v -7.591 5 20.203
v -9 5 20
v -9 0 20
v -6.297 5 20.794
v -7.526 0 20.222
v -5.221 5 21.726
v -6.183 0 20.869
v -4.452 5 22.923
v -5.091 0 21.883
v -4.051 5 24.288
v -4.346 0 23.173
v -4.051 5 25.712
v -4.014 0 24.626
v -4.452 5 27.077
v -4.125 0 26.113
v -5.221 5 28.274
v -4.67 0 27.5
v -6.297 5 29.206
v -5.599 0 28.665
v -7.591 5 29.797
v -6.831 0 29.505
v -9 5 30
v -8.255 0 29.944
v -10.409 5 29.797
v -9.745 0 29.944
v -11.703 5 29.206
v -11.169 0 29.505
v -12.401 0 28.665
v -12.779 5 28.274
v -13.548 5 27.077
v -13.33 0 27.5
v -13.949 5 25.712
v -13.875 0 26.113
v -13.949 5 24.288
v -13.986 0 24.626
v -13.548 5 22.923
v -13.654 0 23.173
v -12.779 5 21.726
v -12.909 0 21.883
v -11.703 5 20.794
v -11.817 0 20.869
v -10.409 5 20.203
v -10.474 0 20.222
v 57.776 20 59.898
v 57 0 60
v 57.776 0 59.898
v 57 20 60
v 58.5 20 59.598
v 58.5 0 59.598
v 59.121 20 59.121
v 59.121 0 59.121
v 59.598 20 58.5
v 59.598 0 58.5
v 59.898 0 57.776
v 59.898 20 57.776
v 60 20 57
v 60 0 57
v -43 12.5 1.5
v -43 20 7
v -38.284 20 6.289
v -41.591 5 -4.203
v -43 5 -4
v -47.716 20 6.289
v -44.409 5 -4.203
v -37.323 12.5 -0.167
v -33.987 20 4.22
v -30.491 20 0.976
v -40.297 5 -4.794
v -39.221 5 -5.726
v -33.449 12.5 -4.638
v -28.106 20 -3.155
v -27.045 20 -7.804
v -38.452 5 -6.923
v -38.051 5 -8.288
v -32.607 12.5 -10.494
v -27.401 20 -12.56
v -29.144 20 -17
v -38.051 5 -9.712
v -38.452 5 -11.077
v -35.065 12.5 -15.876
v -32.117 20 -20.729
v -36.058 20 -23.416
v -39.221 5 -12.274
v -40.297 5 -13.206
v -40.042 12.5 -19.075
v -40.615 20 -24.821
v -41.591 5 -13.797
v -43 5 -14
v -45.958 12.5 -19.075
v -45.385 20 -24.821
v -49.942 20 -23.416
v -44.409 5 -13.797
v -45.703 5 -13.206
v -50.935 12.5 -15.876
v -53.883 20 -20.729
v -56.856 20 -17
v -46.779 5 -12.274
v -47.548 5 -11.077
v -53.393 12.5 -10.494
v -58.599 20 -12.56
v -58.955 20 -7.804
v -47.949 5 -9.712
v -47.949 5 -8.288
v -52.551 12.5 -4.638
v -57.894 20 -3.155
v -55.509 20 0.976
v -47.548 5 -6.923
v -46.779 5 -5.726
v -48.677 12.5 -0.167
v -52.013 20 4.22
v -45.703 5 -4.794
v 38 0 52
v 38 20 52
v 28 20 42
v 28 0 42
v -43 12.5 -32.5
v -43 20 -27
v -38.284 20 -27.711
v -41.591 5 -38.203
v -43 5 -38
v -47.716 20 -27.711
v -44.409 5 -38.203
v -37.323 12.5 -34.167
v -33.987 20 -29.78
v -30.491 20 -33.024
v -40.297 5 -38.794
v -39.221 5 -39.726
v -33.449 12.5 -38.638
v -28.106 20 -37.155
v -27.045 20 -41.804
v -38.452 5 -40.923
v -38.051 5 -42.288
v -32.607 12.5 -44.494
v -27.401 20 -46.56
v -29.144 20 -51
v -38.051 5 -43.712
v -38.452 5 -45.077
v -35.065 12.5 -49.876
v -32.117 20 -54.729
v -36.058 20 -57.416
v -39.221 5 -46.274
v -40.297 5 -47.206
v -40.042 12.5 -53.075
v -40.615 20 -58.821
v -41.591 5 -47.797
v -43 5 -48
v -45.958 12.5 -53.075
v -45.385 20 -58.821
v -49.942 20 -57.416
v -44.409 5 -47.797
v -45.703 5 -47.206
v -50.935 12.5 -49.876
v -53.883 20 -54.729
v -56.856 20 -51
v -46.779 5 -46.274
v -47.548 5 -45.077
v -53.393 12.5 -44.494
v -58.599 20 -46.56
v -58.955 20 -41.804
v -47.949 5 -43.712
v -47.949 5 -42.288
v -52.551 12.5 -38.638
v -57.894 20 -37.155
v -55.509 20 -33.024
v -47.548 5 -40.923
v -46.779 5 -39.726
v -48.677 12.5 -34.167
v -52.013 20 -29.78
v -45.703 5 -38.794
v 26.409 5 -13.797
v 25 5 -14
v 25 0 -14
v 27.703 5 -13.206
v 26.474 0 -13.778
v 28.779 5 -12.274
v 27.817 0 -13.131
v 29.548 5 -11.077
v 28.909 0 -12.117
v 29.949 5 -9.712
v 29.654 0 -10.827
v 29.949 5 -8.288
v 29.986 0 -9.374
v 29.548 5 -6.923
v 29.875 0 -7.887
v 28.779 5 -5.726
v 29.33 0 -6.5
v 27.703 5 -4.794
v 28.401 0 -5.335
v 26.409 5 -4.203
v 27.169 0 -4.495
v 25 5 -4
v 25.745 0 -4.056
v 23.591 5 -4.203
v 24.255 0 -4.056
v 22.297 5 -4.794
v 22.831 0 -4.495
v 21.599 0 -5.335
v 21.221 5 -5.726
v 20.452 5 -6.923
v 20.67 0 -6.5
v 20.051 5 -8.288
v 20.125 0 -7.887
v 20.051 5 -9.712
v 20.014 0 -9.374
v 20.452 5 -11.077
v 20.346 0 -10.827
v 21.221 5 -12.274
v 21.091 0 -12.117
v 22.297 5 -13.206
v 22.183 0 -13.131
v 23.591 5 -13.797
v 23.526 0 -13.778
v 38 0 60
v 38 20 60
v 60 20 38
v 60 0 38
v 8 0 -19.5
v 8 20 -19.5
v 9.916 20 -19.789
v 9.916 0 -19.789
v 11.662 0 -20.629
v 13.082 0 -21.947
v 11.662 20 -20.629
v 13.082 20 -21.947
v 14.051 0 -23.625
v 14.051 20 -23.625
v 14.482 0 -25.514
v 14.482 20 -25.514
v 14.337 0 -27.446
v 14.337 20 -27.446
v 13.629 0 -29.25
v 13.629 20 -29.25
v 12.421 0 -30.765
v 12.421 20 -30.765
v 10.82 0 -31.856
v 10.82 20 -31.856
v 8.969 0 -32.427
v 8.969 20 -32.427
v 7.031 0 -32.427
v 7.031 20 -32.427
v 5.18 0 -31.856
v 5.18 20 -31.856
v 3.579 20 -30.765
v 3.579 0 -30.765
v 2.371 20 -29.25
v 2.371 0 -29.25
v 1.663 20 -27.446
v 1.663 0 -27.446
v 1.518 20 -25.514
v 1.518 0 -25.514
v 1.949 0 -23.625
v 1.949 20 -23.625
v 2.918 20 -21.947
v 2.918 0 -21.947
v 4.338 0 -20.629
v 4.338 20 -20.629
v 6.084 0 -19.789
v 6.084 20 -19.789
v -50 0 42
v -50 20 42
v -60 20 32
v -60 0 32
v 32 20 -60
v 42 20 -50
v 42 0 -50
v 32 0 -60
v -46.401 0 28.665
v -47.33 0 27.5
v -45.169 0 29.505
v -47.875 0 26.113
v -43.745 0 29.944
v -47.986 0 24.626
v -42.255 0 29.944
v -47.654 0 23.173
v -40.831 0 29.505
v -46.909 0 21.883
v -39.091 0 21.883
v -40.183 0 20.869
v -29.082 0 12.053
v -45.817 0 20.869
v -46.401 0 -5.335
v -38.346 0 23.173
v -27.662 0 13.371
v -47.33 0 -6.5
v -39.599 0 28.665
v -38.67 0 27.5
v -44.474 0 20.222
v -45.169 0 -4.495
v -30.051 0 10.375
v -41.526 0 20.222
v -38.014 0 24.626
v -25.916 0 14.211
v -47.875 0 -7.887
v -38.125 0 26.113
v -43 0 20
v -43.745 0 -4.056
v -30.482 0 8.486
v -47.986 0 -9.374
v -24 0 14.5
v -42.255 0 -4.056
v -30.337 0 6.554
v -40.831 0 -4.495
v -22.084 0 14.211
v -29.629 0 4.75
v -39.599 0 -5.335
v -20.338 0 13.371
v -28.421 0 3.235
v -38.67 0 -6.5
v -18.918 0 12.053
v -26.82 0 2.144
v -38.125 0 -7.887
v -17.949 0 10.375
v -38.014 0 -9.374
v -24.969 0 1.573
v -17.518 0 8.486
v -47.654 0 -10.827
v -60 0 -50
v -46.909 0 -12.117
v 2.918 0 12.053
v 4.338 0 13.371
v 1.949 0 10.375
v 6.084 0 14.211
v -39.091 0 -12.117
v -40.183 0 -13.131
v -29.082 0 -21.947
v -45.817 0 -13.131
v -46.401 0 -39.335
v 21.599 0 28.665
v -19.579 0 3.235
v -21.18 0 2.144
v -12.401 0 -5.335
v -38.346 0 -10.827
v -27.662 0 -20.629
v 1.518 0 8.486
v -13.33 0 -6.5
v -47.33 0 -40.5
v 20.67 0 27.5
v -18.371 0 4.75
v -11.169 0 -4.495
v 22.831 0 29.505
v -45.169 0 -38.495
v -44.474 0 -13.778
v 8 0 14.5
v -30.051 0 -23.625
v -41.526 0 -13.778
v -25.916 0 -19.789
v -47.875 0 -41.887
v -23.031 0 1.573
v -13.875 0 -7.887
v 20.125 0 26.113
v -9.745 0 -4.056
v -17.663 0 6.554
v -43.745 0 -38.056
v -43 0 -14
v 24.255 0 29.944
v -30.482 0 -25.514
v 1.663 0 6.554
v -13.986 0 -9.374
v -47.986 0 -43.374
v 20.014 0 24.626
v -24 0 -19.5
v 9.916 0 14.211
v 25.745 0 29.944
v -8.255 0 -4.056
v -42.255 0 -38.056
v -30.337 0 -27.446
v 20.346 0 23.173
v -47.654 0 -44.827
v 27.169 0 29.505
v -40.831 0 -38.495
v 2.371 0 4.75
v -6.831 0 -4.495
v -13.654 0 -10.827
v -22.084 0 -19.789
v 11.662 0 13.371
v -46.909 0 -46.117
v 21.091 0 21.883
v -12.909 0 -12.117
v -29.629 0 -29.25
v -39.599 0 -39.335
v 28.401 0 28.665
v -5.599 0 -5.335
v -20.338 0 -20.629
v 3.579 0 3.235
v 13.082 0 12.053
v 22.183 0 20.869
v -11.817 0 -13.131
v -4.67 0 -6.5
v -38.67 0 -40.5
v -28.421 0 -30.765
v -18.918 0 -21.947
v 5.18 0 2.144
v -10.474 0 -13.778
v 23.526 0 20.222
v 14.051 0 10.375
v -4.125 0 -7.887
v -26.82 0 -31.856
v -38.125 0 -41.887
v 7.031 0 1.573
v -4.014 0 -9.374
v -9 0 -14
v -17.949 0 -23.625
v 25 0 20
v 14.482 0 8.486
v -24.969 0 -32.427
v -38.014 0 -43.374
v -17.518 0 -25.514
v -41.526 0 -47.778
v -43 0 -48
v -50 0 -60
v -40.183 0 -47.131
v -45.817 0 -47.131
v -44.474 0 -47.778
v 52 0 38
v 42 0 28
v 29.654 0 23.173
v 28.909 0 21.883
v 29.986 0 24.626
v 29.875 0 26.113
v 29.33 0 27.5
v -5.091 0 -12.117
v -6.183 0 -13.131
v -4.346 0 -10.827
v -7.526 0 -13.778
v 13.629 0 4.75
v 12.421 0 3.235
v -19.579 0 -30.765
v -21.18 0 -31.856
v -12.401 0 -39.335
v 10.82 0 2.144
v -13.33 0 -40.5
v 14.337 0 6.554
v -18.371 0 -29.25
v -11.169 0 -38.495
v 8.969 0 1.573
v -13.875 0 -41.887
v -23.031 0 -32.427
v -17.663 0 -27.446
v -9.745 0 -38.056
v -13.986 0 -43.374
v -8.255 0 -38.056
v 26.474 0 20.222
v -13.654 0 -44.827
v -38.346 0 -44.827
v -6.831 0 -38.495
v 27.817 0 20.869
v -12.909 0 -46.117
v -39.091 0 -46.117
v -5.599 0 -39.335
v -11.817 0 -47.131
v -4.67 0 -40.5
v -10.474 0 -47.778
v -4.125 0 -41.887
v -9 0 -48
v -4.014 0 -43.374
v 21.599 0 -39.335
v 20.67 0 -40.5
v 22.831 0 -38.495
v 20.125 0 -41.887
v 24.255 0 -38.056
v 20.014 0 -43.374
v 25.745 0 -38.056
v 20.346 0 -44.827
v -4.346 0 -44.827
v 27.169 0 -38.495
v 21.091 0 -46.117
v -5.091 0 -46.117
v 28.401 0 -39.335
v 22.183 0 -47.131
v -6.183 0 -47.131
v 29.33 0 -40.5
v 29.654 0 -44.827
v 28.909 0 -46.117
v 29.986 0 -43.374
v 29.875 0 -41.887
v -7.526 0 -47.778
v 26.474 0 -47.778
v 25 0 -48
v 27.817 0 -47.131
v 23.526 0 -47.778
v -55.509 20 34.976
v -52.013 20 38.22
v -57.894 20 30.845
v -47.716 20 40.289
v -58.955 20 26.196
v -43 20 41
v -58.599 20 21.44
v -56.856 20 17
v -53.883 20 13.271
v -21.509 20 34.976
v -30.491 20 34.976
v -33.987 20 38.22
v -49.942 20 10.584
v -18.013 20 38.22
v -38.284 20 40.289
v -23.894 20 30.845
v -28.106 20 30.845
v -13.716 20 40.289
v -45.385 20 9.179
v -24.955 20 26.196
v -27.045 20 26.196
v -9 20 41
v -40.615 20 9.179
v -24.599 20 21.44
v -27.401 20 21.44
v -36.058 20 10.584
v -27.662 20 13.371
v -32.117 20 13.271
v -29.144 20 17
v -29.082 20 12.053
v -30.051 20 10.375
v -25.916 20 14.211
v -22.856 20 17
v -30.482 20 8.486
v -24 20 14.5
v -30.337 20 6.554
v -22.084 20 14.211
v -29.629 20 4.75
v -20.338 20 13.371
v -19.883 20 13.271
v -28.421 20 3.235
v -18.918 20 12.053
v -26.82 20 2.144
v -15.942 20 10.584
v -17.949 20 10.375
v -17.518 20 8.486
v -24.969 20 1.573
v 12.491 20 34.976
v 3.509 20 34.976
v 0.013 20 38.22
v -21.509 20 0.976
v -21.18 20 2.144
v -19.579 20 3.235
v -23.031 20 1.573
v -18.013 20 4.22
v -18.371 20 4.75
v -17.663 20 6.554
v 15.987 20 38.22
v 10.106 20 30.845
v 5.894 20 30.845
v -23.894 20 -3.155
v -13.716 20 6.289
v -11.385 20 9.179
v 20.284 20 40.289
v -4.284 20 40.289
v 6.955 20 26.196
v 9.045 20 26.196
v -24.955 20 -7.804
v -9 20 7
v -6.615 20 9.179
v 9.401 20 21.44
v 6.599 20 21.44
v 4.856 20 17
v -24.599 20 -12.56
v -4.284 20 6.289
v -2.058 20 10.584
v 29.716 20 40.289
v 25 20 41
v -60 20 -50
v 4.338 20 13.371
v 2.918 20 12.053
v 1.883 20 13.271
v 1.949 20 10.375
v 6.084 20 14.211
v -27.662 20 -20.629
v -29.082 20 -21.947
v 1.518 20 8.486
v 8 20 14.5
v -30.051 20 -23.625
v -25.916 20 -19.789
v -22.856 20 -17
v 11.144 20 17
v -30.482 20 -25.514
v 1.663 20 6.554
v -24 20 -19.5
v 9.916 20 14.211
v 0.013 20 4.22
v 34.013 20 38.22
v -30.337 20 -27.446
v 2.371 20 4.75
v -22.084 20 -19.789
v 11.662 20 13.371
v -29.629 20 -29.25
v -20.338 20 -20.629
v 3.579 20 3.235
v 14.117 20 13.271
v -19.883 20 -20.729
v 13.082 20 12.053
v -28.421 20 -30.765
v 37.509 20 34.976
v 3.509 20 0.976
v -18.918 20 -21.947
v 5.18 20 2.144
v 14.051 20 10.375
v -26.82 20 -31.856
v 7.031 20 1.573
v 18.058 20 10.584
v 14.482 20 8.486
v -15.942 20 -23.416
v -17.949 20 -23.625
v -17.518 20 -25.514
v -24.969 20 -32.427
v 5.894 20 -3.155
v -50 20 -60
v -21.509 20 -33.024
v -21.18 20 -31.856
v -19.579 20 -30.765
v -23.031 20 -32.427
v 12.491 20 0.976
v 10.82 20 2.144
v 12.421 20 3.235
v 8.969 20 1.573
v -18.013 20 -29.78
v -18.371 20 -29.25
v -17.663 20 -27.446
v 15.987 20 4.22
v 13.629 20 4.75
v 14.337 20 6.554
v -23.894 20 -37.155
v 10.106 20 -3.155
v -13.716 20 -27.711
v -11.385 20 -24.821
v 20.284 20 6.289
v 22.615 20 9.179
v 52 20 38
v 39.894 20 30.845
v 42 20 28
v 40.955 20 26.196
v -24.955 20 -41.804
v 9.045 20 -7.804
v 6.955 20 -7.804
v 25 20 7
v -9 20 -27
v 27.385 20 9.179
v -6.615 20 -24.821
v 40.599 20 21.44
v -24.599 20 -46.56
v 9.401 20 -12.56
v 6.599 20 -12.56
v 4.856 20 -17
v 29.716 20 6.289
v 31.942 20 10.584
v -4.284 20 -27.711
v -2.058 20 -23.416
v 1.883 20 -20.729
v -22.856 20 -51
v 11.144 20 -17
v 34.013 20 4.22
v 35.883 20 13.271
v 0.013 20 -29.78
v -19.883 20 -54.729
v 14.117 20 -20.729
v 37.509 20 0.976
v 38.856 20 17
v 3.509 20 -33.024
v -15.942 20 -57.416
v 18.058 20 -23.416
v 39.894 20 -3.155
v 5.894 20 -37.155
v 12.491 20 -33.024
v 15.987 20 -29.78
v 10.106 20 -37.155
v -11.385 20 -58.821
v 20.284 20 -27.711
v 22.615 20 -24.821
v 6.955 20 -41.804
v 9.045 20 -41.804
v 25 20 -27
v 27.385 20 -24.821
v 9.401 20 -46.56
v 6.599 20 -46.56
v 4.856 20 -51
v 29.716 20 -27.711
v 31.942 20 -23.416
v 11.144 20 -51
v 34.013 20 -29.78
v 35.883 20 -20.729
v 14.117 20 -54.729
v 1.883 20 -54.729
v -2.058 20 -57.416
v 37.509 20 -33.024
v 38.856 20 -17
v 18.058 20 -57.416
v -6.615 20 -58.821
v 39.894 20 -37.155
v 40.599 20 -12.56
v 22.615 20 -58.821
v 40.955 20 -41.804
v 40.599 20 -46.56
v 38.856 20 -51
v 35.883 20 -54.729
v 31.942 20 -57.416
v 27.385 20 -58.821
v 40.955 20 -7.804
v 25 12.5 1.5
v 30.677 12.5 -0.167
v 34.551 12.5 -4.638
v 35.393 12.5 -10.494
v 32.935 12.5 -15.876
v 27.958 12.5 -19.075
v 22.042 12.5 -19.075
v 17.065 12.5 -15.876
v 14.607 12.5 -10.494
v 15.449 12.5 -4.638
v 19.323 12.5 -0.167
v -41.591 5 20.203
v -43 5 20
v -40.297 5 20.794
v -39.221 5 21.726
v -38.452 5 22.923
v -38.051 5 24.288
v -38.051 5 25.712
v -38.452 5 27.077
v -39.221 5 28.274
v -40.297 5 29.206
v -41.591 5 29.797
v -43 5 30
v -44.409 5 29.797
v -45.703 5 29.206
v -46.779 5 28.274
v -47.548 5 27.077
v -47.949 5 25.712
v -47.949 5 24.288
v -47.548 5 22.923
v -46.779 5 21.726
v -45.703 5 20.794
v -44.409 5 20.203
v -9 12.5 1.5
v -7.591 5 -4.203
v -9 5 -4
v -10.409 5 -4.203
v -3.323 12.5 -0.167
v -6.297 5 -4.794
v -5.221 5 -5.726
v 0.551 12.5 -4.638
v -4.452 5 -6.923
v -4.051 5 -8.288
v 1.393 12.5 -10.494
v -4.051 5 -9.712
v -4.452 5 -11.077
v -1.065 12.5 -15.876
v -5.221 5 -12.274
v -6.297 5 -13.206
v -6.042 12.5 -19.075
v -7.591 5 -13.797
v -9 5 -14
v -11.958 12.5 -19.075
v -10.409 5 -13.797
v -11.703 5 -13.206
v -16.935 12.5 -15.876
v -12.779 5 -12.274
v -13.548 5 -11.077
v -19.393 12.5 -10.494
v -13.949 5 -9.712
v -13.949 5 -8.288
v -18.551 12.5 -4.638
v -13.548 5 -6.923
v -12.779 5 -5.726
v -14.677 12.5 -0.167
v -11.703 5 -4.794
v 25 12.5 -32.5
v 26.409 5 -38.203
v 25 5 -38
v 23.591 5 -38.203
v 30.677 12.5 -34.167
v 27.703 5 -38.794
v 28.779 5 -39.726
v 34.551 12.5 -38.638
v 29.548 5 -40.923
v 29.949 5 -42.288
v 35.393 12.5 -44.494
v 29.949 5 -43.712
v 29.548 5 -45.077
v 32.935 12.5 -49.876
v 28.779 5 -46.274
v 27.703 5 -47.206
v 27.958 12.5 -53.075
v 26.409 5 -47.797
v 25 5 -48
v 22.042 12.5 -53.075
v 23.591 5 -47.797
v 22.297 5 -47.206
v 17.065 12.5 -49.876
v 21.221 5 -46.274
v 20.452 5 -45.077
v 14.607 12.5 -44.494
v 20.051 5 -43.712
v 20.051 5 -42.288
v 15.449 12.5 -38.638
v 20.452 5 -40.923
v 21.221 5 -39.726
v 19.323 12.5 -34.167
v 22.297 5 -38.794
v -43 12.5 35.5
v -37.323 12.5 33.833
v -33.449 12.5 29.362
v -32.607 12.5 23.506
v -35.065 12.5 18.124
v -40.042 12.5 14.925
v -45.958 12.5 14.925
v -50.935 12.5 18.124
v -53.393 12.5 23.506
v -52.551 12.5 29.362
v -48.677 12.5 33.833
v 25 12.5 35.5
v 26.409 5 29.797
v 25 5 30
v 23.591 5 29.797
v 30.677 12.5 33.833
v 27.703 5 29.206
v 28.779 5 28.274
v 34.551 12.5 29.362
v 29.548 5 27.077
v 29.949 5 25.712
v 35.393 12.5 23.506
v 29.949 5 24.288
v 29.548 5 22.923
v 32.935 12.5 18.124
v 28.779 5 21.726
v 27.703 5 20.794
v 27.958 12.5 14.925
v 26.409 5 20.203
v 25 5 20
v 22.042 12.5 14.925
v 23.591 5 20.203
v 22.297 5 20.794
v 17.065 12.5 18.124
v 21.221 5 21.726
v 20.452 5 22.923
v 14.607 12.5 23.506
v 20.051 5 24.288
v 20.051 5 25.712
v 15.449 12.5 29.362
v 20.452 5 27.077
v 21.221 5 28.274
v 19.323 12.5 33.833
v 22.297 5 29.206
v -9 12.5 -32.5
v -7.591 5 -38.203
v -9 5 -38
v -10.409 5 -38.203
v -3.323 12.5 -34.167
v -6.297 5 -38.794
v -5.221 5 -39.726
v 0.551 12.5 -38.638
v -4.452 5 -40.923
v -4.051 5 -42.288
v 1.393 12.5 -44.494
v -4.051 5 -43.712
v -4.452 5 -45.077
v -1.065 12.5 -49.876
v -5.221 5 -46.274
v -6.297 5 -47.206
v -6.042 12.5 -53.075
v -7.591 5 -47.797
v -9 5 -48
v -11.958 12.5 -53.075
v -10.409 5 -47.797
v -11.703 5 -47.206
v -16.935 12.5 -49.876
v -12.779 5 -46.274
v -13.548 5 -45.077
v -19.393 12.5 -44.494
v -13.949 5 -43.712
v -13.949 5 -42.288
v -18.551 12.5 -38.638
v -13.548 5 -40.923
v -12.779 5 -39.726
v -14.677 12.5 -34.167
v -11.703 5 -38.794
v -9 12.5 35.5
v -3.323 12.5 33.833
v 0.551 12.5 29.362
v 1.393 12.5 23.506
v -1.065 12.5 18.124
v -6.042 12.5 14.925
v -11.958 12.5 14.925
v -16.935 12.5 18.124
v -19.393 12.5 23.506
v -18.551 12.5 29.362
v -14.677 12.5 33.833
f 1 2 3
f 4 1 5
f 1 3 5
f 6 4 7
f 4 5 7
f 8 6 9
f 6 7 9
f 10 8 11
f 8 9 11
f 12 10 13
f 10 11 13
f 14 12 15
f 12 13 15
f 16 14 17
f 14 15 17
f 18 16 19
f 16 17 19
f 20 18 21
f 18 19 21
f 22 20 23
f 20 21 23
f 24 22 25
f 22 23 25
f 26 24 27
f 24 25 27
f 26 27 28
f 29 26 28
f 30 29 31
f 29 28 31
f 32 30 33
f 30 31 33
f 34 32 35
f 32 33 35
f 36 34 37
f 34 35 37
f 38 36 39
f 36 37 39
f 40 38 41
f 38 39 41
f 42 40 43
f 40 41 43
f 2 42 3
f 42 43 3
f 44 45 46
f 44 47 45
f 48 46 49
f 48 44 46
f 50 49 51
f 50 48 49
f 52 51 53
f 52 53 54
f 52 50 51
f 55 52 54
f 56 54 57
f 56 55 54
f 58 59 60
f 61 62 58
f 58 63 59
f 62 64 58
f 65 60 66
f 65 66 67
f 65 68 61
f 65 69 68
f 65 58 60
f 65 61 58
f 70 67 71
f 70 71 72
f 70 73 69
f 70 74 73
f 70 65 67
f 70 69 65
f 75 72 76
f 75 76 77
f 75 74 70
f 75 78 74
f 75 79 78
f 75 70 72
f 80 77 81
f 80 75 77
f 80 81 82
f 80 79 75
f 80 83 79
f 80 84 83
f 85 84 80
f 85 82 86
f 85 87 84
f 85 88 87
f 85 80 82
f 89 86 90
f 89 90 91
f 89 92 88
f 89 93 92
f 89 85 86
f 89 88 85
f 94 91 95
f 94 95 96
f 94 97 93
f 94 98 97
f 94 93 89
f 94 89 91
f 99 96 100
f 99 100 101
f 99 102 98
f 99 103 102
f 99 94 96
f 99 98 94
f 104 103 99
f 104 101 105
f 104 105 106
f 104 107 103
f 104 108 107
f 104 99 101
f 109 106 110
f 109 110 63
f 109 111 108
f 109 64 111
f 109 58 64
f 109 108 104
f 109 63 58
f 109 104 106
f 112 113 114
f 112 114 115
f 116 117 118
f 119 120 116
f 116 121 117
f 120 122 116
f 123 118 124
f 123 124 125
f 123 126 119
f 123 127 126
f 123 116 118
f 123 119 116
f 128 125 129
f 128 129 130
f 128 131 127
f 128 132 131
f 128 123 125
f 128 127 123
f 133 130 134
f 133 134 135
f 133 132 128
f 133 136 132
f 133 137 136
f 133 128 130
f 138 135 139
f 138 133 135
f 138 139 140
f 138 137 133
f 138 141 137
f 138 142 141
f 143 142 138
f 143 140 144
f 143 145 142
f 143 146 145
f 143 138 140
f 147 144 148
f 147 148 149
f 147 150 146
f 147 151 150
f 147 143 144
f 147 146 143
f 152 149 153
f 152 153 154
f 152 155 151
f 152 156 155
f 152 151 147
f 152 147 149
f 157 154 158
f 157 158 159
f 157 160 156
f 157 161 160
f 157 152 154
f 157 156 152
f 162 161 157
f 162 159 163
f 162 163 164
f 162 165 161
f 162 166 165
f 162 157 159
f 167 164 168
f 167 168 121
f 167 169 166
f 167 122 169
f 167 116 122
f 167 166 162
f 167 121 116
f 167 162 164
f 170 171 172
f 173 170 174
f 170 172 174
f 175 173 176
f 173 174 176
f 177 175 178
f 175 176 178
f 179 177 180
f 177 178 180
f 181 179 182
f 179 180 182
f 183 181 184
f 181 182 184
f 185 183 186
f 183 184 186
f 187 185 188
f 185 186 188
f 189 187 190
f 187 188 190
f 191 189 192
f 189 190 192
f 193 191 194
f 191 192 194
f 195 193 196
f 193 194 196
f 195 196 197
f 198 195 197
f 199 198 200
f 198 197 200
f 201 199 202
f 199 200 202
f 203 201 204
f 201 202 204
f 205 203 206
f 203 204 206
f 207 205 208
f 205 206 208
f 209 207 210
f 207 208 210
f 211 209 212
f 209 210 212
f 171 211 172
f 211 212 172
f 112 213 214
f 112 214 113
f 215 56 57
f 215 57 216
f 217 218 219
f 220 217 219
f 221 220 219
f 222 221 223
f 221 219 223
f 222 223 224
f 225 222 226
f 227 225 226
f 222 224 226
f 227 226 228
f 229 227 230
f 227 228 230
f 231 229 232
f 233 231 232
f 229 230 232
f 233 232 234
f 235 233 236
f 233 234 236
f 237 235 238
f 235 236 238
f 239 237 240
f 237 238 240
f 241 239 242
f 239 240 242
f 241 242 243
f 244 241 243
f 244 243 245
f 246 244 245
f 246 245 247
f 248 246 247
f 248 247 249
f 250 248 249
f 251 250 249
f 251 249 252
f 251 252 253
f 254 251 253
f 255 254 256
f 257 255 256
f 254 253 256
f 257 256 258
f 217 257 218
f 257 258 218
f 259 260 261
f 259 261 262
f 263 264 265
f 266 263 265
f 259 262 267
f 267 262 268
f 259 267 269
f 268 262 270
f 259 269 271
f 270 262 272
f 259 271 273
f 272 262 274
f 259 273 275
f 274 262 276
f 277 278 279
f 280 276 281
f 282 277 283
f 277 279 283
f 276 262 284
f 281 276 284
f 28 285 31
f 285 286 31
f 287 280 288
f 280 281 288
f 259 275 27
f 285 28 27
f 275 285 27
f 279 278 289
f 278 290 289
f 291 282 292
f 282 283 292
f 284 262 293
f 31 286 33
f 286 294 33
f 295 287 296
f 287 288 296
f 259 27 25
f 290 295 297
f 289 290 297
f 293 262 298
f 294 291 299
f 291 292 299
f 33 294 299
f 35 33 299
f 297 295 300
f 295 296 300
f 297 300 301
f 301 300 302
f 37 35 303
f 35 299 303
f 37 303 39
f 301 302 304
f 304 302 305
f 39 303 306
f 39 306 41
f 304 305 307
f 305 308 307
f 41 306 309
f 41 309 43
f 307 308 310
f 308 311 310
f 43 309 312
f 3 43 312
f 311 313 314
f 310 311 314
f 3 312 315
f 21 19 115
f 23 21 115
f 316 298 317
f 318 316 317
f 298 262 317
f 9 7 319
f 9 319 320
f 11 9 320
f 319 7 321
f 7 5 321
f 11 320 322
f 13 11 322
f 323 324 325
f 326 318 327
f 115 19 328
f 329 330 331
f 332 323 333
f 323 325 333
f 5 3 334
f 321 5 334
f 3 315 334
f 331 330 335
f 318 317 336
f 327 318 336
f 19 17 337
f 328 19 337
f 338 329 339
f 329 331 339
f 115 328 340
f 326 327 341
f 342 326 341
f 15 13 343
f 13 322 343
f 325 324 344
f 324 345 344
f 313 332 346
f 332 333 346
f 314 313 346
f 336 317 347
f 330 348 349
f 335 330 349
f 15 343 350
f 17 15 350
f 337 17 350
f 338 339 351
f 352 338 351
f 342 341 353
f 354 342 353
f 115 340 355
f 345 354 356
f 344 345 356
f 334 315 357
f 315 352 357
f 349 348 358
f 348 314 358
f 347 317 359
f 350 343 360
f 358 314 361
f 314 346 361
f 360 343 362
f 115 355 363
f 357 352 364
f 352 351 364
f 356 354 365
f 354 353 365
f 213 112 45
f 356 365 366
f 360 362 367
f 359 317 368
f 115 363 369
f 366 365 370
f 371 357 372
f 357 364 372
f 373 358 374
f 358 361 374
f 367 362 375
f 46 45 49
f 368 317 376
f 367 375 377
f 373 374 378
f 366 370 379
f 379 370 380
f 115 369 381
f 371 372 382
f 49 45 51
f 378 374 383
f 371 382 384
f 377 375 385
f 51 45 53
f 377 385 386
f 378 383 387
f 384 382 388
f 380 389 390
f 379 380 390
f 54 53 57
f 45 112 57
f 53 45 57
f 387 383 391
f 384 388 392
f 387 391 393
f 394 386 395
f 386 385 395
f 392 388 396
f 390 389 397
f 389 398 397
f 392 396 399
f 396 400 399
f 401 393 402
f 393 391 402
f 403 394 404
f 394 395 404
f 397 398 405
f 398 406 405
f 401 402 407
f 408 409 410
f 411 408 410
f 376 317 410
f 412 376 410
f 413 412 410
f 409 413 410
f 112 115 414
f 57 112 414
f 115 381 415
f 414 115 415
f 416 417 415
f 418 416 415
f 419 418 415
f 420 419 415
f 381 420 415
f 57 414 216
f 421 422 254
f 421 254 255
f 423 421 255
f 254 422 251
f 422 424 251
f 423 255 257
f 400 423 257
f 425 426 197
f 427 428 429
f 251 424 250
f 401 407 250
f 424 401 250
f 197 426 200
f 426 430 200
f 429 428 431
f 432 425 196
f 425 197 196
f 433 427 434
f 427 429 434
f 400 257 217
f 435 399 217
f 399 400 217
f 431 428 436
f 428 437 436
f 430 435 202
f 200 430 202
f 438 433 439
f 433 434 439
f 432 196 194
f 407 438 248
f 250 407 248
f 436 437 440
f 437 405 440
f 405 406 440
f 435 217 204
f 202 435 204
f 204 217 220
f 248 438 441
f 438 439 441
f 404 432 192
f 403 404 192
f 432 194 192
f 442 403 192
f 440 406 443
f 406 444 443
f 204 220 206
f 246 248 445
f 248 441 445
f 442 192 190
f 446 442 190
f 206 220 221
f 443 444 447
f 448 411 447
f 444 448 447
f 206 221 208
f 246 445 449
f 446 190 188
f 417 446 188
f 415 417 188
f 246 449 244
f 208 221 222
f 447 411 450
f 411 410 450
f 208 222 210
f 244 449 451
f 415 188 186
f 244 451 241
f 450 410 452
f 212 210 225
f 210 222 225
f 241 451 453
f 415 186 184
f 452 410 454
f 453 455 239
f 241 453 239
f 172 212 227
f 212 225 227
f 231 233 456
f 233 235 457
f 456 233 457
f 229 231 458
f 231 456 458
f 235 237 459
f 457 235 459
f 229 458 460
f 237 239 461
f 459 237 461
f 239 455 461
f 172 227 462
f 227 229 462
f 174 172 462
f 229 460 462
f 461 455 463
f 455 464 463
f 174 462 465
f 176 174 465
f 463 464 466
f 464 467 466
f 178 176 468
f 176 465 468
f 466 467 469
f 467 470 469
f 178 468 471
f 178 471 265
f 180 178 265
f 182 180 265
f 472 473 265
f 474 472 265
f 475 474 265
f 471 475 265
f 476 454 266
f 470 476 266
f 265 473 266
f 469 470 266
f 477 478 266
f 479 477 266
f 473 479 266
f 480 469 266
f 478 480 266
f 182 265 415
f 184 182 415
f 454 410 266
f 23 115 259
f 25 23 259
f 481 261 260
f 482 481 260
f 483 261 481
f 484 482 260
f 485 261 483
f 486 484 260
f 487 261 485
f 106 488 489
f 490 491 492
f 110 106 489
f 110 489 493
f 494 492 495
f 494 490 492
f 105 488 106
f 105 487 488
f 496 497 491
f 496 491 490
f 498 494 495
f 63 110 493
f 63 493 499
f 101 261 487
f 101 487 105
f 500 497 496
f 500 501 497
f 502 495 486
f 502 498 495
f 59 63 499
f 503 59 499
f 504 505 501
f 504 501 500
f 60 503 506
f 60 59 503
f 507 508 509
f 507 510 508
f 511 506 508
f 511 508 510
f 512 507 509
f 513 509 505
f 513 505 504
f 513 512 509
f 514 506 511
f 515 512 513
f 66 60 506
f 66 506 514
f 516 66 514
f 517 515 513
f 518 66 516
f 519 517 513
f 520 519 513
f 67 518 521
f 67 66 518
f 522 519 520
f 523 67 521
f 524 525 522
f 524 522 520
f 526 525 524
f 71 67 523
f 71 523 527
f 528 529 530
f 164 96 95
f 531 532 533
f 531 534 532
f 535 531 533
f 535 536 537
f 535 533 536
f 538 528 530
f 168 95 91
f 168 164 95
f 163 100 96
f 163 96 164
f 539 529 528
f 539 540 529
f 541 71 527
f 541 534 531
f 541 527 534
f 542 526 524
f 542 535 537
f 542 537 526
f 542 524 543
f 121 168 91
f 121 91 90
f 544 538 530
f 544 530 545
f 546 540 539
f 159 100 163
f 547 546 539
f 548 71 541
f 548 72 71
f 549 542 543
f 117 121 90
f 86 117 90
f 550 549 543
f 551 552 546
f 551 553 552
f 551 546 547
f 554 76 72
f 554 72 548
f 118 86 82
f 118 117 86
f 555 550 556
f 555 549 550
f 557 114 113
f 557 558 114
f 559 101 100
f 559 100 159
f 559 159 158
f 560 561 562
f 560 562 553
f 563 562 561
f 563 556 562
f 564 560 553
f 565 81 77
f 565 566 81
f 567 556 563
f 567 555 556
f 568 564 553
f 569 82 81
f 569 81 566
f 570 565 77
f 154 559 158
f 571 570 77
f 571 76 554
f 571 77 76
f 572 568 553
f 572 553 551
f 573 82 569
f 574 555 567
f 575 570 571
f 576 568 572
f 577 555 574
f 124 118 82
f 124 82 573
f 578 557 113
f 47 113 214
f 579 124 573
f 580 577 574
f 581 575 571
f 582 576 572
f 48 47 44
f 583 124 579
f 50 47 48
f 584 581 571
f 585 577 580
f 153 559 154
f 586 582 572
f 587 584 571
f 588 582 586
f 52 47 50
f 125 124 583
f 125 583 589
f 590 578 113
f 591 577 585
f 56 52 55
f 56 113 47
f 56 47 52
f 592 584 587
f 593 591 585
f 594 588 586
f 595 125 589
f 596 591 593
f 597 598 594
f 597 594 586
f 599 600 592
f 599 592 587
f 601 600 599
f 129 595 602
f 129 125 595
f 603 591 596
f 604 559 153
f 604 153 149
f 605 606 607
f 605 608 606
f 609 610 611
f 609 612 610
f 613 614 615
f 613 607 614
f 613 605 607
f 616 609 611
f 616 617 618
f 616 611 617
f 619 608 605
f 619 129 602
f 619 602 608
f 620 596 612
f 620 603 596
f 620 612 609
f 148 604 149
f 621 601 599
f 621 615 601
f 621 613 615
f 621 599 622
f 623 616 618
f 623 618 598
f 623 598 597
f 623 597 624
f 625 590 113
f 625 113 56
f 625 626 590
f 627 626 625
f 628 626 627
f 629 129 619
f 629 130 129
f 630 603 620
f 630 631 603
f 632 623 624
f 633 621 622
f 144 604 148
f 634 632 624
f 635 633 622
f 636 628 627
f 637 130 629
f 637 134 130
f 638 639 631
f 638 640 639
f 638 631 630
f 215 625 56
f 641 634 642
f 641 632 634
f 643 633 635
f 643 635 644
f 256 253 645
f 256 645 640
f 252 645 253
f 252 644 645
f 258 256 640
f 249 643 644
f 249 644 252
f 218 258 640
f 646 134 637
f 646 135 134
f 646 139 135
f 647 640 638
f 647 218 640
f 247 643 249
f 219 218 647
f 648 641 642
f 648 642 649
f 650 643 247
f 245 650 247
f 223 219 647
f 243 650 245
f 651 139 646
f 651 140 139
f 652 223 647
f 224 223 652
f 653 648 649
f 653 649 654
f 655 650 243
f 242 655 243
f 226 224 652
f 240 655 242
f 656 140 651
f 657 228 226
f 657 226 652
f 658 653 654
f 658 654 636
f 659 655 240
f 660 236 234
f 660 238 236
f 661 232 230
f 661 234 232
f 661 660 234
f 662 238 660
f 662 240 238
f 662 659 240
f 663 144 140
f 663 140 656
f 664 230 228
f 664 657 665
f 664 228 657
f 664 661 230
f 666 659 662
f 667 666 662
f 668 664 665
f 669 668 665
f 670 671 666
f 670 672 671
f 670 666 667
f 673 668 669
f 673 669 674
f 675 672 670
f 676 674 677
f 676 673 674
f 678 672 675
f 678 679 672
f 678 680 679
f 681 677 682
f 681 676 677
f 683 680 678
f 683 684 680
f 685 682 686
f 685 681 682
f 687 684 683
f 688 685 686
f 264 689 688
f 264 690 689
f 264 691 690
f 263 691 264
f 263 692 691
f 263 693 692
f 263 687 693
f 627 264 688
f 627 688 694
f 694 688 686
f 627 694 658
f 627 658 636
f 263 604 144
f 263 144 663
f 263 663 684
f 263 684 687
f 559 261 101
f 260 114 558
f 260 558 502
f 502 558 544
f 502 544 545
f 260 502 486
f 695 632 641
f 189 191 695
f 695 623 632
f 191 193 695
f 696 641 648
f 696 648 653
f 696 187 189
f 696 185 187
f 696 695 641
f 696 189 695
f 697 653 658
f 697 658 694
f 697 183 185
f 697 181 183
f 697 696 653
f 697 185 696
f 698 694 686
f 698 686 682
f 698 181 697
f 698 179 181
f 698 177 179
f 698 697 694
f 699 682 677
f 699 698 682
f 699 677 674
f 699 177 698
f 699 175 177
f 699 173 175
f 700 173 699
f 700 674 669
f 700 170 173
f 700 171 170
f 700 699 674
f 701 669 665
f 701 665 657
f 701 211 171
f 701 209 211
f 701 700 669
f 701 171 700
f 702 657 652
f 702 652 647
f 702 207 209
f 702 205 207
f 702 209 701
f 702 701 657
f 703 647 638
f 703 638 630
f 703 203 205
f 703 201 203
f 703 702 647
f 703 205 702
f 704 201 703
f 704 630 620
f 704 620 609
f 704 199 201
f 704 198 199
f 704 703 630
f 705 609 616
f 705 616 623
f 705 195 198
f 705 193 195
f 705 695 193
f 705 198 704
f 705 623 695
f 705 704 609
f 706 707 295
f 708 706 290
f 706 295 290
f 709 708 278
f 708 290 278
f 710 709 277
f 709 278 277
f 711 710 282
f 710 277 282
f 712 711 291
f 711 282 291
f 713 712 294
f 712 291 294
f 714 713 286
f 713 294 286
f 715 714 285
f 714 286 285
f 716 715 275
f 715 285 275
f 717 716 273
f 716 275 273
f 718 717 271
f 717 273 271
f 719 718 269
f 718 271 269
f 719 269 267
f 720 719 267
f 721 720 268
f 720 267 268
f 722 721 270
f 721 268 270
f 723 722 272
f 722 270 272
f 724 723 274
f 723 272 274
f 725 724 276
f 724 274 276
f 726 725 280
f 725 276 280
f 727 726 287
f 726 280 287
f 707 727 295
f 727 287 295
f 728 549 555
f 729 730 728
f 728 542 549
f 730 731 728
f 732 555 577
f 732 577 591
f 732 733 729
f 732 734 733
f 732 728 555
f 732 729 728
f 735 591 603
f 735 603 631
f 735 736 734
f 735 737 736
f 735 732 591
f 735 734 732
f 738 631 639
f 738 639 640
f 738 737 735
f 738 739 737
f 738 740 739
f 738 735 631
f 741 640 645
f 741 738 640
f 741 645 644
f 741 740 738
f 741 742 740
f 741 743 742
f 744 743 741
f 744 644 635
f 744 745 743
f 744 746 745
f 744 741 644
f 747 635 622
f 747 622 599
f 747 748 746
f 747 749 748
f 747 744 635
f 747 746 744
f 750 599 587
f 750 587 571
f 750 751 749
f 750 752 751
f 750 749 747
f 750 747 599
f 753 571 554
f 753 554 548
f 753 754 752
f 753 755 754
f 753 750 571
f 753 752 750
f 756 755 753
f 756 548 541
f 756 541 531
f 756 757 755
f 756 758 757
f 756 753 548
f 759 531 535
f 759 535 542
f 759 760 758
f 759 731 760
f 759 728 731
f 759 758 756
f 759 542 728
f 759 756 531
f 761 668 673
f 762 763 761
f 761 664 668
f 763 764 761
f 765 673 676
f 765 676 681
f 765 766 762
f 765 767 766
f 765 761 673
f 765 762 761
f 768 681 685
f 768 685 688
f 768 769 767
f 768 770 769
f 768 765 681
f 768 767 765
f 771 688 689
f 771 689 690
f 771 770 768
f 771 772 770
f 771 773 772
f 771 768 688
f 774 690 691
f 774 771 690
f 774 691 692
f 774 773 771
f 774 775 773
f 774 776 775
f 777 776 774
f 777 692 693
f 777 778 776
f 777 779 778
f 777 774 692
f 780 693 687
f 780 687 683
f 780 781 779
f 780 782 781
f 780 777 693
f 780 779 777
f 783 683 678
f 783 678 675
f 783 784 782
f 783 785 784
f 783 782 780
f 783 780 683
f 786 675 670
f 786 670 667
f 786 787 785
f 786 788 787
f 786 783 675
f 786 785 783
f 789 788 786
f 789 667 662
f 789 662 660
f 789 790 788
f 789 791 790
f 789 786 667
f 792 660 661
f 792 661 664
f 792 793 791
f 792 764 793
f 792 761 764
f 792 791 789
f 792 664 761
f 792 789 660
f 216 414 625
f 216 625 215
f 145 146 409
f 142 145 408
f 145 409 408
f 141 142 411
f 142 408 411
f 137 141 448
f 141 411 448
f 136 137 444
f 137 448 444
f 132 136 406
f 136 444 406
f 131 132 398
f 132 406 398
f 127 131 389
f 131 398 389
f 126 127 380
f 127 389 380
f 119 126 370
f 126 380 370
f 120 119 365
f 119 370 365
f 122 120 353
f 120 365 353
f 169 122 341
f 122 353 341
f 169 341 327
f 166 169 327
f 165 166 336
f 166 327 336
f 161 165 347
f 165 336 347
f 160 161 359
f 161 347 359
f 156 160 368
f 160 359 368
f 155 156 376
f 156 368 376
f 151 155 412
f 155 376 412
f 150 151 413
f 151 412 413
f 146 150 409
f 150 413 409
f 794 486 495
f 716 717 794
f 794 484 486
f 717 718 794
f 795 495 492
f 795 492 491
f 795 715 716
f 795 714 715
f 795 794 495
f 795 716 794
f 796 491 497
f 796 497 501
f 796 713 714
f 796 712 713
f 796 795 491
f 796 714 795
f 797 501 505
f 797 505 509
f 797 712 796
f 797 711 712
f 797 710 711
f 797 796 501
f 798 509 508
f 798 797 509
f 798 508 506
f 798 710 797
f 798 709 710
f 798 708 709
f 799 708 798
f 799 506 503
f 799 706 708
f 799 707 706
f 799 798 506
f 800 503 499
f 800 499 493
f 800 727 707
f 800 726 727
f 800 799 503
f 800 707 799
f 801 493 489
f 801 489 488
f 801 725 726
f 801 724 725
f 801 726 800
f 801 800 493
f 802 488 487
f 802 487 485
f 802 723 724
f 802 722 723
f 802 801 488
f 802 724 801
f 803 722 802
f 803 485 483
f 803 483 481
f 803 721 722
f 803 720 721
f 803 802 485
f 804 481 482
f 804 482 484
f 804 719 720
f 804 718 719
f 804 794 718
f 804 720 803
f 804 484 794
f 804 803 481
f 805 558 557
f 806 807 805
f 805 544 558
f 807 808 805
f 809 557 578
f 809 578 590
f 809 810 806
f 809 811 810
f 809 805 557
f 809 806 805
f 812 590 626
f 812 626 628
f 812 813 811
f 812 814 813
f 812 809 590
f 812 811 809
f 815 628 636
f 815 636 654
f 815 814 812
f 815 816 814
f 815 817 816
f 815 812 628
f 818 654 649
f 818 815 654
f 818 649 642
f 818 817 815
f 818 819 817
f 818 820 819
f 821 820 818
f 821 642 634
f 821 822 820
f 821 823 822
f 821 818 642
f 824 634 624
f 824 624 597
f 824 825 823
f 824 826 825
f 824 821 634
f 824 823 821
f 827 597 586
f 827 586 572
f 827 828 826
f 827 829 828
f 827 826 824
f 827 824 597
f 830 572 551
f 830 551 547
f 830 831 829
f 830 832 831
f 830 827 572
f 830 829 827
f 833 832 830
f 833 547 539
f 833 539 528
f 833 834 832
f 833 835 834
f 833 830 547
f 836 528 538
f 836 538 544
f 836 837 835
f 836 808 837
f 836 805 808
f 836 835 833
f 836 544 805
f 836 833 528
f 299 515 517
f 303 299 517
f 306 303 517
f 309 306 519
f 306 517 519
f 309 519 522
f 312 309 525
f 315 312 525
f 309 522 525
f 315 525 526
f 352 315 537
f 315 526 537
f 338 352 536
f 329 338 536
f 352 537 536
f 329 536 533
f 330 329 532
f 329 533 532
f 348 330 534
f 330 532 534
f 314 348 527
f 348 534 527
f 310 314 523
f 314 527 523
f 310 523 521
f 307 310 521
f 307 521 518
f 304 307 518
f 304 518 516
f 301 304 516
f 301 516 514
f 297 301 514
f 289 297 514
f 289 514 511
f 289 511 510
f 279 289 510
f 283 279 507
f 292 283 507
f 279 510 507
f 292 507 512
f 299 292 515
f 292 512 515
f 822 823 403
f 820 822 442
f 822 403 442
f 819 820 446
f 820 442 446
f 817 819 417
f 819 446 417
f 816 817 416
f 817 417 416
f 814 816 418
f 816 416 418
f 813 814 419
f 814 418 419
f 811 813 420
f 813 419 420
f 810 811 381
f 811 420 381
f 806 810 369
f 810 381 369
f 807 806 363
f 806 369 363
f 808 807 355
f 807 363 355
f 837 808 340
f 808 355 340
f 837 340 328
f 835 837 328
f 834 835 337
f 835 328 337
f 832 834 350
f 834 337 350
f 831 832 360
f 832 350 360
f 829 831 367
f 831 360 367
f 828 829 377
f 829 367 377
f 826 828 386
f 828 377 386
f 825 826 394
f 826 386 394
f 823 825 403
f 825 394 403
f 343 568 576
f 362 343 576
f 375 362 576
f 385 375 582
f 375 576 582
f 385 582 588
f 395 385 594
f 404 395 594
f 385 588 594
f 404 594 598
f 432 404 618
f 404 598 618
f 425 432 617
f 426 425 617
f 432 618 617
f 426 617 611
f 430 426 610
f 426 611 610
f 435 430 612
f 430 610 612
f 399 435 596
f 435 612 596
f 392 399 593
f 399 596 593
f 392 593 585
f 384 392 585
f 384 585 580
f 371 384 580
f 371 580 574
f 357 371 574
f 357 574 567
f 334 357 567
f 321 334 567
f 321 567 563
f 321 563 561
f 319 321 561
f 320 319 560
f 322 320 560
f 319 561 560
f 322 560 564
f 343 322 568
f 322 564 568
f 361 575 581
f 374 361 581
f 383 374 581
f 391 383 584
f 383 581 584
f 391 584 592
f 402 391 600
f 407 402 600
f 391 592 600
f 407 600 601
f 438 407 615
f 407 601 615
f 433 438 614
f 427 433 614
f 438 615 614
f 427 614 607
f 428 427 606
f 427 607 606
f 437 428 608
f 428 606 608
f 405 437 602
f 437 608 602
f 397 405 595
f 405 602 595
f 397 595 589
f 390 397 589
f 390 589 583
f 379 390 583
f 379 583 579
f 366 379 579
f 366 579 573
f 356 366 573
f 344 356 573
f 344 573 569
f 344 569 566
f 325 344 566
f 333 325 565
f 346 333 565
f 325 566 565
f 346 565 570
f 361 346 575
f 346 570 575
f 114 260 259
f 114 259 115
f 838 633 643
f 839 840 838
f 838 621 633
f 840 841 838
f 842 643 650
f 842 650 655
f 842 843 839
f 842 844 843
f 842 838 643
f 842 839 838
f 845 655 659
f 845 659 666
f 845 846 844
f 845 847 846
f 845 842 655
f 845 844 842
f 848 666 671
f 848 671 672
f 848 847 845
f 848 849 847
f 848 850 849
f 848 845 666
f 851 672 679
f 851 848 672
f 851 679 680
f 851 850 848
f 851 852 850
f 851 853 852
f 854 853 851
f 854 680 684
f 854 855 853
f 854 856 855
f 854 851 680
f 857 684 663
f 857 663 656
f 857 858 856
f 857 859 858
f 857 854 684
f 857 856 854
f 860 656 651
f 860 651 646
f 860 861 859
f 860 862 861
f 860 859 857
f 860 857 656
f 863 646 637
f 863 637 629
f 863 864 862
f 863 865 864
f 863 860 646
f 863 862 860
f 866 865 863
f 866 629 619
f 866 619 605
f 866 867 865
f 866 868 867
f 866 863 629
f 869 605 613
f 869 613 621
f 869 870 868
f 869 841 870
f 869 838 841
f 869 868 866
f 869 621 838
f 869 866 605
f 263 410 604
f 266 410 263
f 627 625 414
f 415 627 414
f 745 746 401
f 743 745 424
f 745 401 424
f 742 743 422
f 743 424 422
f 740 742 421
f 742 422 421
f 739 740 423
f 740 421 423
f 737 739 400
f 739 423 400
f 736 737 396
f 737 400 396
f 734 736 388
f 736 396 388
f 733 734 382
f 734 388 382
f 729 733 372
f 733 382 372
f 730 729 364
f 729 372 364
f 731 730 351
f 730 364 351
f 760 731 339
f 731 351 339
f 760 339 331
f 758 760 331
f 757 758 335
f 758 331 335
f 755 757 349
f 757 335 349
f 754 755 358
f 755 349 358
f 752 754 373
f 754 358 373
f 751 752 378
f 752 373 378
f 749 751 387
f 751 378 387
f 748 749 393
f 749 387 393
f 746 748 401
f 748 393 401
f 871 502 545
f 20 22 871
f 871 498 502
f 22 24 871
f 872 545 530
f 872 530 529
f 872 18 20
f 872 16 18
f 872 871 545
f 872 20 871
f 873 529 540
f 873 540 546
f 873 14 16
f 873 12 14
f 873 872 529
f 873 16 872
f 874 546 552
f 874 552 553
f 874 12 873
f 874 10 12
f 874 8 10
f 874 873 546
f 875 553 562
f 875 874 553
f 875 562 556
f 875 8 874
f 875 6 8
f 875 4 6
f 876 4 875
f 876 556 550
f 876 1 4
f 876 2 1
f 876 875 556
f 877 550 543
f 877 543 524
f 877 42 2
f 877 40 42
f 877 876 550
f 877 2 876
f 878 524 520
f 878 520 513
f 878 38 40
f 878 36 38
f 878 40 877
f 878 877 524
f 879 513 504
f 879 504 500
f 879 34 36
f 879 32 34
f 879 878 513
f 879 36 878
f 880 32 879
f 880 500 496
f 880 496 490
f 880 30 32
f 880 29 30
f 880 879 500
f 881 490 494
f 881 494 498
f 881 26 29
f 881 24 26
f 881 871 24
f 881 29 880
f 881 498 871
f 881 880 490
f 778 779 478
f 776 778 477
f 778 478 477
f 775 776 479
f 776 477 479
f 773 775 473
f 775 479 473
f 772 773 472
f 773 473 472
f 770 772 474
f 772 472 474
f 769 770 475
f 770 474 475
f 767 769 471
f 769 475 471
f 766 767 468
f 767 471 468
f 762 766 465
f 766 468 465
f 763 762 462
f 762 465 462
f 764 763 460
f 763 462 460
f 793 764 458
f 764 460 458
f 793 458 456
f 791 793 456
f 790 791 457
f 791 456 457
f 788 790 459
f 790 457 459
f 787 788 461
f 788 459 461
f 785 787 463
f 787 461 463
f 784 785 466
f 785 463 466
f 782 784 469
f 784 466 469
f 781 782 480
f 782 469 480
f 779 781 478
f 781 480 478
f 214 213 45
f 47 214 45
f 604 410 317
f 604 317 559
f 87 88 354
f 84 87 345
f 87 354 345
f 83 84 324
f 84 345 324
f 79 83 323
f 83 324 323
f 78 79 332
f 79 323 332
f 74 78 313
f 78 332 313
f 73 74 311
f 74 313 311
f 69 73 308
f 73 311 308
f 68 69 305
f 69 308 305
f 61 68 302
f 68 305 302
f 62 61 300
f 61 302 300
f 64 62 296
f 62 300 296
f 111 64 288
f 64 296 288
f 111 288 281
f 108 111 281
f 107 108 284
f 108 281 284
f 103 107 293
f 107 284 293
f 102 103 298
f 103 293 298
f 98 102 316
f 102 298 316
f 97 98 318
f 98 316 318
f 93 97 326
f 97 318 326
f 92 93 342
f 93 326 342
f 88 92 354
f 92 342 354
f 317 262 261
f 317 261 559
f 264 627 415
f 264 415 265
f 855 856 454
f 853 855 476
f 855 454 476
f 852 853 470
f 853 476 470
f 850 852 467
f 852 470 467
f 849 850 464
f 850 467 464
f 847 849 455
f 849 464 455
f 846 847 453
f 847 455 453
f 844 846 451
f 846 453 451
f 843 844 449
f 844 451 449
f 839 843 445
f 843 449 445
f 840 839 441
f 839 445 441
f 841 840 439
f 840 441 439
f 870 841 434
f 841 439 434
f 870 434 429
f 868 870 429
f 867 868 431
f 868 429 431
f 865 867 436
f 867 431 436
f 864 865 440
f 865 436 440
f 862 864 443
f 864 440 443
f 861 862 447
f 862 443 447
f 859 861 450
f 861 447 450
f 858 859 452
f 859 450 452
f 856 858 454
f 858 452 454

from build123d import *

# Parameters (mm, degrees)
SCHIZZO1_W                   = 120
SCHIZZO1_H                   = 120
ESTRUSIONE_ESTRUSIONE1_DEPTH = 20
SCHIZZO5_R                   = 5
TAGLIO_ESTRUSIONE2_DEPTH     = 87.168439698
RIPETIZIONE_A_L1_COUNT       = 3
RIPETIZIONE_A_L1_PITCH       = 34
RIPETIZIONE_A_L1_COUNT_DIR2  = 3
RIPETIZIONE_A_L1_PITCH_DIR2  = 34
SCHIZZO7_W                   = 98
SCHIZZO7_H                   = 18
SCHIZZO7_W_2                 = 18
SCHIZZO7_H_2                 = 98
TAGLIO_ESTRUSIONE3_DEPTH     = 20
SMUSSO1_SIZE                 = 10
SCHIZZO8_R                   = 6.5
TAGLIO_ESTRUSIONE4_DEPTH     = 20
RIPETIZIONE_A_L2_COUNT       = 2
RIPETIZIONE_A_L2_PITCH       = 34
RIPETIZIONE_A_L2_COUNT_DIR2  = 2
RIPETIZIONE_A_L2_PITCH_DIR2  = 32
RACCORDO1_R                  = 3


with BuildPart() as part:
    # Schizzo1 → Estrusione-Estrusione1 (new body)
    with BuildSketch(Plane(origin=(0, 0, 0), x_dir=(1, 0, 0), z_dir=(0, 1, 0))):
        Rectangle(SCHIZZO1_W, SCHIZZO1_H)
    extrude(amount=ESTRUSIONE_ESTRUSIONE1_DEPTH)

    # Schizzo6 → Taglia-Rivoluzione4 (revolve, cut)
    with BuildSketch(Plane.ZY.offset(43)):
        Polygon((-43, 20), (-27, 20), (-38, 5), (-43, 5), align=None)
    taglia_rivoluzione4 = revolve(axis=Axis((-43, 5, -43), (0, 1, 0)), mode=Mode.SUBTRACT)

    # Schizzo5 → Taglio-Estrusione2 (cut, symmetric)
    with BuildSketch(Plane(origin=(0, 5, 0), x_dir=(-1, 0, 0), z_dir=(0, -1, 0))):
        with Locations((43, 43)):
            Circle(SCHIZZO5_R)
    taglio_estrusione2 = extrude(amount=TAGLIO_ESTRUSIONE2_DEPTH, both=True, mode=Mode.SUBTRACT)

    # Ripetizione a L1: Taglia-Rivoluzione4, Taglio-Estrusione2 3 × 3
    with Locations(*[(i * RIPETIZIONE_A_L1_PITCH, 0, j * RIPETIZIONE_A_L1_PITCH_DIR2) for i in range(RIPETIZIONE_A_L1_COUNT) for j in range(RIPETIZIONE_A_L1_COUNT_DIR2) if (i, j) != (0, 0)]):
        add(taglia_rivoluzione4, mode=Mode.SUBTRACT)
        add(taglio_estrusione2, mode=Mode.SUBTRACT)

    # Schizzo7 → Taglio-Estrusione3 (cut)
    with BuildSketch(Plane(origin=(0, 20, 0), x_dir=(1, 0, 0), z_dir=(0, 1, 0))):
        with Locations((-11, -51)):
            Rectangle(SCHIZZO7_W, SCHIZZO7_H)
        with Locations((51, 11)):
            Rectangle(SCHIZZO7_W_2, SCHIZZO7_H_2)
    extrude(amount=-TAGLIO_ESTRUSIONE3_DEPTH, mode=Mode.SUBTRACT)

    # Smusso1
    smusso1_edges = [part.edges().sort_by_distance(p)[0] for p in [
        (-60, 10, 42),
        (-60, 10, -60),
        (42, 10, -60),
        (42, 10, 38),
        (38, 10, 42),
    ]]
    chamfer(smusso1_edges, length=SMUSSO1_SIZE)

    # Schizzo8 → Taglio-Estrusione4 (cut)
    with BuildSketch(Plane(origin=(0, 20, 0), x_dir=(1, 0, 0), z_dir=(0, 1, 0))):
        with Locations((8, -8)):
            Circle(SCHIZZO8_R)
    taglio_estrusione4 = extrude(amount=-TAGLIO_ESTRUSIONE4_DEPTH, mode=Mode.SUBTRACT)

    # Ripetizione a L2: Taglio-Estrusione4 2 × 2
    with Locations(*[(-j * RIPETIZIONE_A_L2_PITCH_DIR2, 0, -i * RIPETIZIONE_A_L2_PITCH) for i in range(RIPETIZIONE_A_L2_COUNT) for j in range(RIPETIZIONE_A_L2_COUNT_DIR2) if (i, j) != (0, 0)]):
        add(taglio_estrusione4, mode=Mode.SUBTRACT)

    # Raccordo1
    raccordo1_edges = [part.edges().sort_by_distance(p)[0] for p in [
        (60, 10, 60),
    ]]
    fillet(raccordo1_edges, radius=RACCORDO1_R)


solid = part.part
